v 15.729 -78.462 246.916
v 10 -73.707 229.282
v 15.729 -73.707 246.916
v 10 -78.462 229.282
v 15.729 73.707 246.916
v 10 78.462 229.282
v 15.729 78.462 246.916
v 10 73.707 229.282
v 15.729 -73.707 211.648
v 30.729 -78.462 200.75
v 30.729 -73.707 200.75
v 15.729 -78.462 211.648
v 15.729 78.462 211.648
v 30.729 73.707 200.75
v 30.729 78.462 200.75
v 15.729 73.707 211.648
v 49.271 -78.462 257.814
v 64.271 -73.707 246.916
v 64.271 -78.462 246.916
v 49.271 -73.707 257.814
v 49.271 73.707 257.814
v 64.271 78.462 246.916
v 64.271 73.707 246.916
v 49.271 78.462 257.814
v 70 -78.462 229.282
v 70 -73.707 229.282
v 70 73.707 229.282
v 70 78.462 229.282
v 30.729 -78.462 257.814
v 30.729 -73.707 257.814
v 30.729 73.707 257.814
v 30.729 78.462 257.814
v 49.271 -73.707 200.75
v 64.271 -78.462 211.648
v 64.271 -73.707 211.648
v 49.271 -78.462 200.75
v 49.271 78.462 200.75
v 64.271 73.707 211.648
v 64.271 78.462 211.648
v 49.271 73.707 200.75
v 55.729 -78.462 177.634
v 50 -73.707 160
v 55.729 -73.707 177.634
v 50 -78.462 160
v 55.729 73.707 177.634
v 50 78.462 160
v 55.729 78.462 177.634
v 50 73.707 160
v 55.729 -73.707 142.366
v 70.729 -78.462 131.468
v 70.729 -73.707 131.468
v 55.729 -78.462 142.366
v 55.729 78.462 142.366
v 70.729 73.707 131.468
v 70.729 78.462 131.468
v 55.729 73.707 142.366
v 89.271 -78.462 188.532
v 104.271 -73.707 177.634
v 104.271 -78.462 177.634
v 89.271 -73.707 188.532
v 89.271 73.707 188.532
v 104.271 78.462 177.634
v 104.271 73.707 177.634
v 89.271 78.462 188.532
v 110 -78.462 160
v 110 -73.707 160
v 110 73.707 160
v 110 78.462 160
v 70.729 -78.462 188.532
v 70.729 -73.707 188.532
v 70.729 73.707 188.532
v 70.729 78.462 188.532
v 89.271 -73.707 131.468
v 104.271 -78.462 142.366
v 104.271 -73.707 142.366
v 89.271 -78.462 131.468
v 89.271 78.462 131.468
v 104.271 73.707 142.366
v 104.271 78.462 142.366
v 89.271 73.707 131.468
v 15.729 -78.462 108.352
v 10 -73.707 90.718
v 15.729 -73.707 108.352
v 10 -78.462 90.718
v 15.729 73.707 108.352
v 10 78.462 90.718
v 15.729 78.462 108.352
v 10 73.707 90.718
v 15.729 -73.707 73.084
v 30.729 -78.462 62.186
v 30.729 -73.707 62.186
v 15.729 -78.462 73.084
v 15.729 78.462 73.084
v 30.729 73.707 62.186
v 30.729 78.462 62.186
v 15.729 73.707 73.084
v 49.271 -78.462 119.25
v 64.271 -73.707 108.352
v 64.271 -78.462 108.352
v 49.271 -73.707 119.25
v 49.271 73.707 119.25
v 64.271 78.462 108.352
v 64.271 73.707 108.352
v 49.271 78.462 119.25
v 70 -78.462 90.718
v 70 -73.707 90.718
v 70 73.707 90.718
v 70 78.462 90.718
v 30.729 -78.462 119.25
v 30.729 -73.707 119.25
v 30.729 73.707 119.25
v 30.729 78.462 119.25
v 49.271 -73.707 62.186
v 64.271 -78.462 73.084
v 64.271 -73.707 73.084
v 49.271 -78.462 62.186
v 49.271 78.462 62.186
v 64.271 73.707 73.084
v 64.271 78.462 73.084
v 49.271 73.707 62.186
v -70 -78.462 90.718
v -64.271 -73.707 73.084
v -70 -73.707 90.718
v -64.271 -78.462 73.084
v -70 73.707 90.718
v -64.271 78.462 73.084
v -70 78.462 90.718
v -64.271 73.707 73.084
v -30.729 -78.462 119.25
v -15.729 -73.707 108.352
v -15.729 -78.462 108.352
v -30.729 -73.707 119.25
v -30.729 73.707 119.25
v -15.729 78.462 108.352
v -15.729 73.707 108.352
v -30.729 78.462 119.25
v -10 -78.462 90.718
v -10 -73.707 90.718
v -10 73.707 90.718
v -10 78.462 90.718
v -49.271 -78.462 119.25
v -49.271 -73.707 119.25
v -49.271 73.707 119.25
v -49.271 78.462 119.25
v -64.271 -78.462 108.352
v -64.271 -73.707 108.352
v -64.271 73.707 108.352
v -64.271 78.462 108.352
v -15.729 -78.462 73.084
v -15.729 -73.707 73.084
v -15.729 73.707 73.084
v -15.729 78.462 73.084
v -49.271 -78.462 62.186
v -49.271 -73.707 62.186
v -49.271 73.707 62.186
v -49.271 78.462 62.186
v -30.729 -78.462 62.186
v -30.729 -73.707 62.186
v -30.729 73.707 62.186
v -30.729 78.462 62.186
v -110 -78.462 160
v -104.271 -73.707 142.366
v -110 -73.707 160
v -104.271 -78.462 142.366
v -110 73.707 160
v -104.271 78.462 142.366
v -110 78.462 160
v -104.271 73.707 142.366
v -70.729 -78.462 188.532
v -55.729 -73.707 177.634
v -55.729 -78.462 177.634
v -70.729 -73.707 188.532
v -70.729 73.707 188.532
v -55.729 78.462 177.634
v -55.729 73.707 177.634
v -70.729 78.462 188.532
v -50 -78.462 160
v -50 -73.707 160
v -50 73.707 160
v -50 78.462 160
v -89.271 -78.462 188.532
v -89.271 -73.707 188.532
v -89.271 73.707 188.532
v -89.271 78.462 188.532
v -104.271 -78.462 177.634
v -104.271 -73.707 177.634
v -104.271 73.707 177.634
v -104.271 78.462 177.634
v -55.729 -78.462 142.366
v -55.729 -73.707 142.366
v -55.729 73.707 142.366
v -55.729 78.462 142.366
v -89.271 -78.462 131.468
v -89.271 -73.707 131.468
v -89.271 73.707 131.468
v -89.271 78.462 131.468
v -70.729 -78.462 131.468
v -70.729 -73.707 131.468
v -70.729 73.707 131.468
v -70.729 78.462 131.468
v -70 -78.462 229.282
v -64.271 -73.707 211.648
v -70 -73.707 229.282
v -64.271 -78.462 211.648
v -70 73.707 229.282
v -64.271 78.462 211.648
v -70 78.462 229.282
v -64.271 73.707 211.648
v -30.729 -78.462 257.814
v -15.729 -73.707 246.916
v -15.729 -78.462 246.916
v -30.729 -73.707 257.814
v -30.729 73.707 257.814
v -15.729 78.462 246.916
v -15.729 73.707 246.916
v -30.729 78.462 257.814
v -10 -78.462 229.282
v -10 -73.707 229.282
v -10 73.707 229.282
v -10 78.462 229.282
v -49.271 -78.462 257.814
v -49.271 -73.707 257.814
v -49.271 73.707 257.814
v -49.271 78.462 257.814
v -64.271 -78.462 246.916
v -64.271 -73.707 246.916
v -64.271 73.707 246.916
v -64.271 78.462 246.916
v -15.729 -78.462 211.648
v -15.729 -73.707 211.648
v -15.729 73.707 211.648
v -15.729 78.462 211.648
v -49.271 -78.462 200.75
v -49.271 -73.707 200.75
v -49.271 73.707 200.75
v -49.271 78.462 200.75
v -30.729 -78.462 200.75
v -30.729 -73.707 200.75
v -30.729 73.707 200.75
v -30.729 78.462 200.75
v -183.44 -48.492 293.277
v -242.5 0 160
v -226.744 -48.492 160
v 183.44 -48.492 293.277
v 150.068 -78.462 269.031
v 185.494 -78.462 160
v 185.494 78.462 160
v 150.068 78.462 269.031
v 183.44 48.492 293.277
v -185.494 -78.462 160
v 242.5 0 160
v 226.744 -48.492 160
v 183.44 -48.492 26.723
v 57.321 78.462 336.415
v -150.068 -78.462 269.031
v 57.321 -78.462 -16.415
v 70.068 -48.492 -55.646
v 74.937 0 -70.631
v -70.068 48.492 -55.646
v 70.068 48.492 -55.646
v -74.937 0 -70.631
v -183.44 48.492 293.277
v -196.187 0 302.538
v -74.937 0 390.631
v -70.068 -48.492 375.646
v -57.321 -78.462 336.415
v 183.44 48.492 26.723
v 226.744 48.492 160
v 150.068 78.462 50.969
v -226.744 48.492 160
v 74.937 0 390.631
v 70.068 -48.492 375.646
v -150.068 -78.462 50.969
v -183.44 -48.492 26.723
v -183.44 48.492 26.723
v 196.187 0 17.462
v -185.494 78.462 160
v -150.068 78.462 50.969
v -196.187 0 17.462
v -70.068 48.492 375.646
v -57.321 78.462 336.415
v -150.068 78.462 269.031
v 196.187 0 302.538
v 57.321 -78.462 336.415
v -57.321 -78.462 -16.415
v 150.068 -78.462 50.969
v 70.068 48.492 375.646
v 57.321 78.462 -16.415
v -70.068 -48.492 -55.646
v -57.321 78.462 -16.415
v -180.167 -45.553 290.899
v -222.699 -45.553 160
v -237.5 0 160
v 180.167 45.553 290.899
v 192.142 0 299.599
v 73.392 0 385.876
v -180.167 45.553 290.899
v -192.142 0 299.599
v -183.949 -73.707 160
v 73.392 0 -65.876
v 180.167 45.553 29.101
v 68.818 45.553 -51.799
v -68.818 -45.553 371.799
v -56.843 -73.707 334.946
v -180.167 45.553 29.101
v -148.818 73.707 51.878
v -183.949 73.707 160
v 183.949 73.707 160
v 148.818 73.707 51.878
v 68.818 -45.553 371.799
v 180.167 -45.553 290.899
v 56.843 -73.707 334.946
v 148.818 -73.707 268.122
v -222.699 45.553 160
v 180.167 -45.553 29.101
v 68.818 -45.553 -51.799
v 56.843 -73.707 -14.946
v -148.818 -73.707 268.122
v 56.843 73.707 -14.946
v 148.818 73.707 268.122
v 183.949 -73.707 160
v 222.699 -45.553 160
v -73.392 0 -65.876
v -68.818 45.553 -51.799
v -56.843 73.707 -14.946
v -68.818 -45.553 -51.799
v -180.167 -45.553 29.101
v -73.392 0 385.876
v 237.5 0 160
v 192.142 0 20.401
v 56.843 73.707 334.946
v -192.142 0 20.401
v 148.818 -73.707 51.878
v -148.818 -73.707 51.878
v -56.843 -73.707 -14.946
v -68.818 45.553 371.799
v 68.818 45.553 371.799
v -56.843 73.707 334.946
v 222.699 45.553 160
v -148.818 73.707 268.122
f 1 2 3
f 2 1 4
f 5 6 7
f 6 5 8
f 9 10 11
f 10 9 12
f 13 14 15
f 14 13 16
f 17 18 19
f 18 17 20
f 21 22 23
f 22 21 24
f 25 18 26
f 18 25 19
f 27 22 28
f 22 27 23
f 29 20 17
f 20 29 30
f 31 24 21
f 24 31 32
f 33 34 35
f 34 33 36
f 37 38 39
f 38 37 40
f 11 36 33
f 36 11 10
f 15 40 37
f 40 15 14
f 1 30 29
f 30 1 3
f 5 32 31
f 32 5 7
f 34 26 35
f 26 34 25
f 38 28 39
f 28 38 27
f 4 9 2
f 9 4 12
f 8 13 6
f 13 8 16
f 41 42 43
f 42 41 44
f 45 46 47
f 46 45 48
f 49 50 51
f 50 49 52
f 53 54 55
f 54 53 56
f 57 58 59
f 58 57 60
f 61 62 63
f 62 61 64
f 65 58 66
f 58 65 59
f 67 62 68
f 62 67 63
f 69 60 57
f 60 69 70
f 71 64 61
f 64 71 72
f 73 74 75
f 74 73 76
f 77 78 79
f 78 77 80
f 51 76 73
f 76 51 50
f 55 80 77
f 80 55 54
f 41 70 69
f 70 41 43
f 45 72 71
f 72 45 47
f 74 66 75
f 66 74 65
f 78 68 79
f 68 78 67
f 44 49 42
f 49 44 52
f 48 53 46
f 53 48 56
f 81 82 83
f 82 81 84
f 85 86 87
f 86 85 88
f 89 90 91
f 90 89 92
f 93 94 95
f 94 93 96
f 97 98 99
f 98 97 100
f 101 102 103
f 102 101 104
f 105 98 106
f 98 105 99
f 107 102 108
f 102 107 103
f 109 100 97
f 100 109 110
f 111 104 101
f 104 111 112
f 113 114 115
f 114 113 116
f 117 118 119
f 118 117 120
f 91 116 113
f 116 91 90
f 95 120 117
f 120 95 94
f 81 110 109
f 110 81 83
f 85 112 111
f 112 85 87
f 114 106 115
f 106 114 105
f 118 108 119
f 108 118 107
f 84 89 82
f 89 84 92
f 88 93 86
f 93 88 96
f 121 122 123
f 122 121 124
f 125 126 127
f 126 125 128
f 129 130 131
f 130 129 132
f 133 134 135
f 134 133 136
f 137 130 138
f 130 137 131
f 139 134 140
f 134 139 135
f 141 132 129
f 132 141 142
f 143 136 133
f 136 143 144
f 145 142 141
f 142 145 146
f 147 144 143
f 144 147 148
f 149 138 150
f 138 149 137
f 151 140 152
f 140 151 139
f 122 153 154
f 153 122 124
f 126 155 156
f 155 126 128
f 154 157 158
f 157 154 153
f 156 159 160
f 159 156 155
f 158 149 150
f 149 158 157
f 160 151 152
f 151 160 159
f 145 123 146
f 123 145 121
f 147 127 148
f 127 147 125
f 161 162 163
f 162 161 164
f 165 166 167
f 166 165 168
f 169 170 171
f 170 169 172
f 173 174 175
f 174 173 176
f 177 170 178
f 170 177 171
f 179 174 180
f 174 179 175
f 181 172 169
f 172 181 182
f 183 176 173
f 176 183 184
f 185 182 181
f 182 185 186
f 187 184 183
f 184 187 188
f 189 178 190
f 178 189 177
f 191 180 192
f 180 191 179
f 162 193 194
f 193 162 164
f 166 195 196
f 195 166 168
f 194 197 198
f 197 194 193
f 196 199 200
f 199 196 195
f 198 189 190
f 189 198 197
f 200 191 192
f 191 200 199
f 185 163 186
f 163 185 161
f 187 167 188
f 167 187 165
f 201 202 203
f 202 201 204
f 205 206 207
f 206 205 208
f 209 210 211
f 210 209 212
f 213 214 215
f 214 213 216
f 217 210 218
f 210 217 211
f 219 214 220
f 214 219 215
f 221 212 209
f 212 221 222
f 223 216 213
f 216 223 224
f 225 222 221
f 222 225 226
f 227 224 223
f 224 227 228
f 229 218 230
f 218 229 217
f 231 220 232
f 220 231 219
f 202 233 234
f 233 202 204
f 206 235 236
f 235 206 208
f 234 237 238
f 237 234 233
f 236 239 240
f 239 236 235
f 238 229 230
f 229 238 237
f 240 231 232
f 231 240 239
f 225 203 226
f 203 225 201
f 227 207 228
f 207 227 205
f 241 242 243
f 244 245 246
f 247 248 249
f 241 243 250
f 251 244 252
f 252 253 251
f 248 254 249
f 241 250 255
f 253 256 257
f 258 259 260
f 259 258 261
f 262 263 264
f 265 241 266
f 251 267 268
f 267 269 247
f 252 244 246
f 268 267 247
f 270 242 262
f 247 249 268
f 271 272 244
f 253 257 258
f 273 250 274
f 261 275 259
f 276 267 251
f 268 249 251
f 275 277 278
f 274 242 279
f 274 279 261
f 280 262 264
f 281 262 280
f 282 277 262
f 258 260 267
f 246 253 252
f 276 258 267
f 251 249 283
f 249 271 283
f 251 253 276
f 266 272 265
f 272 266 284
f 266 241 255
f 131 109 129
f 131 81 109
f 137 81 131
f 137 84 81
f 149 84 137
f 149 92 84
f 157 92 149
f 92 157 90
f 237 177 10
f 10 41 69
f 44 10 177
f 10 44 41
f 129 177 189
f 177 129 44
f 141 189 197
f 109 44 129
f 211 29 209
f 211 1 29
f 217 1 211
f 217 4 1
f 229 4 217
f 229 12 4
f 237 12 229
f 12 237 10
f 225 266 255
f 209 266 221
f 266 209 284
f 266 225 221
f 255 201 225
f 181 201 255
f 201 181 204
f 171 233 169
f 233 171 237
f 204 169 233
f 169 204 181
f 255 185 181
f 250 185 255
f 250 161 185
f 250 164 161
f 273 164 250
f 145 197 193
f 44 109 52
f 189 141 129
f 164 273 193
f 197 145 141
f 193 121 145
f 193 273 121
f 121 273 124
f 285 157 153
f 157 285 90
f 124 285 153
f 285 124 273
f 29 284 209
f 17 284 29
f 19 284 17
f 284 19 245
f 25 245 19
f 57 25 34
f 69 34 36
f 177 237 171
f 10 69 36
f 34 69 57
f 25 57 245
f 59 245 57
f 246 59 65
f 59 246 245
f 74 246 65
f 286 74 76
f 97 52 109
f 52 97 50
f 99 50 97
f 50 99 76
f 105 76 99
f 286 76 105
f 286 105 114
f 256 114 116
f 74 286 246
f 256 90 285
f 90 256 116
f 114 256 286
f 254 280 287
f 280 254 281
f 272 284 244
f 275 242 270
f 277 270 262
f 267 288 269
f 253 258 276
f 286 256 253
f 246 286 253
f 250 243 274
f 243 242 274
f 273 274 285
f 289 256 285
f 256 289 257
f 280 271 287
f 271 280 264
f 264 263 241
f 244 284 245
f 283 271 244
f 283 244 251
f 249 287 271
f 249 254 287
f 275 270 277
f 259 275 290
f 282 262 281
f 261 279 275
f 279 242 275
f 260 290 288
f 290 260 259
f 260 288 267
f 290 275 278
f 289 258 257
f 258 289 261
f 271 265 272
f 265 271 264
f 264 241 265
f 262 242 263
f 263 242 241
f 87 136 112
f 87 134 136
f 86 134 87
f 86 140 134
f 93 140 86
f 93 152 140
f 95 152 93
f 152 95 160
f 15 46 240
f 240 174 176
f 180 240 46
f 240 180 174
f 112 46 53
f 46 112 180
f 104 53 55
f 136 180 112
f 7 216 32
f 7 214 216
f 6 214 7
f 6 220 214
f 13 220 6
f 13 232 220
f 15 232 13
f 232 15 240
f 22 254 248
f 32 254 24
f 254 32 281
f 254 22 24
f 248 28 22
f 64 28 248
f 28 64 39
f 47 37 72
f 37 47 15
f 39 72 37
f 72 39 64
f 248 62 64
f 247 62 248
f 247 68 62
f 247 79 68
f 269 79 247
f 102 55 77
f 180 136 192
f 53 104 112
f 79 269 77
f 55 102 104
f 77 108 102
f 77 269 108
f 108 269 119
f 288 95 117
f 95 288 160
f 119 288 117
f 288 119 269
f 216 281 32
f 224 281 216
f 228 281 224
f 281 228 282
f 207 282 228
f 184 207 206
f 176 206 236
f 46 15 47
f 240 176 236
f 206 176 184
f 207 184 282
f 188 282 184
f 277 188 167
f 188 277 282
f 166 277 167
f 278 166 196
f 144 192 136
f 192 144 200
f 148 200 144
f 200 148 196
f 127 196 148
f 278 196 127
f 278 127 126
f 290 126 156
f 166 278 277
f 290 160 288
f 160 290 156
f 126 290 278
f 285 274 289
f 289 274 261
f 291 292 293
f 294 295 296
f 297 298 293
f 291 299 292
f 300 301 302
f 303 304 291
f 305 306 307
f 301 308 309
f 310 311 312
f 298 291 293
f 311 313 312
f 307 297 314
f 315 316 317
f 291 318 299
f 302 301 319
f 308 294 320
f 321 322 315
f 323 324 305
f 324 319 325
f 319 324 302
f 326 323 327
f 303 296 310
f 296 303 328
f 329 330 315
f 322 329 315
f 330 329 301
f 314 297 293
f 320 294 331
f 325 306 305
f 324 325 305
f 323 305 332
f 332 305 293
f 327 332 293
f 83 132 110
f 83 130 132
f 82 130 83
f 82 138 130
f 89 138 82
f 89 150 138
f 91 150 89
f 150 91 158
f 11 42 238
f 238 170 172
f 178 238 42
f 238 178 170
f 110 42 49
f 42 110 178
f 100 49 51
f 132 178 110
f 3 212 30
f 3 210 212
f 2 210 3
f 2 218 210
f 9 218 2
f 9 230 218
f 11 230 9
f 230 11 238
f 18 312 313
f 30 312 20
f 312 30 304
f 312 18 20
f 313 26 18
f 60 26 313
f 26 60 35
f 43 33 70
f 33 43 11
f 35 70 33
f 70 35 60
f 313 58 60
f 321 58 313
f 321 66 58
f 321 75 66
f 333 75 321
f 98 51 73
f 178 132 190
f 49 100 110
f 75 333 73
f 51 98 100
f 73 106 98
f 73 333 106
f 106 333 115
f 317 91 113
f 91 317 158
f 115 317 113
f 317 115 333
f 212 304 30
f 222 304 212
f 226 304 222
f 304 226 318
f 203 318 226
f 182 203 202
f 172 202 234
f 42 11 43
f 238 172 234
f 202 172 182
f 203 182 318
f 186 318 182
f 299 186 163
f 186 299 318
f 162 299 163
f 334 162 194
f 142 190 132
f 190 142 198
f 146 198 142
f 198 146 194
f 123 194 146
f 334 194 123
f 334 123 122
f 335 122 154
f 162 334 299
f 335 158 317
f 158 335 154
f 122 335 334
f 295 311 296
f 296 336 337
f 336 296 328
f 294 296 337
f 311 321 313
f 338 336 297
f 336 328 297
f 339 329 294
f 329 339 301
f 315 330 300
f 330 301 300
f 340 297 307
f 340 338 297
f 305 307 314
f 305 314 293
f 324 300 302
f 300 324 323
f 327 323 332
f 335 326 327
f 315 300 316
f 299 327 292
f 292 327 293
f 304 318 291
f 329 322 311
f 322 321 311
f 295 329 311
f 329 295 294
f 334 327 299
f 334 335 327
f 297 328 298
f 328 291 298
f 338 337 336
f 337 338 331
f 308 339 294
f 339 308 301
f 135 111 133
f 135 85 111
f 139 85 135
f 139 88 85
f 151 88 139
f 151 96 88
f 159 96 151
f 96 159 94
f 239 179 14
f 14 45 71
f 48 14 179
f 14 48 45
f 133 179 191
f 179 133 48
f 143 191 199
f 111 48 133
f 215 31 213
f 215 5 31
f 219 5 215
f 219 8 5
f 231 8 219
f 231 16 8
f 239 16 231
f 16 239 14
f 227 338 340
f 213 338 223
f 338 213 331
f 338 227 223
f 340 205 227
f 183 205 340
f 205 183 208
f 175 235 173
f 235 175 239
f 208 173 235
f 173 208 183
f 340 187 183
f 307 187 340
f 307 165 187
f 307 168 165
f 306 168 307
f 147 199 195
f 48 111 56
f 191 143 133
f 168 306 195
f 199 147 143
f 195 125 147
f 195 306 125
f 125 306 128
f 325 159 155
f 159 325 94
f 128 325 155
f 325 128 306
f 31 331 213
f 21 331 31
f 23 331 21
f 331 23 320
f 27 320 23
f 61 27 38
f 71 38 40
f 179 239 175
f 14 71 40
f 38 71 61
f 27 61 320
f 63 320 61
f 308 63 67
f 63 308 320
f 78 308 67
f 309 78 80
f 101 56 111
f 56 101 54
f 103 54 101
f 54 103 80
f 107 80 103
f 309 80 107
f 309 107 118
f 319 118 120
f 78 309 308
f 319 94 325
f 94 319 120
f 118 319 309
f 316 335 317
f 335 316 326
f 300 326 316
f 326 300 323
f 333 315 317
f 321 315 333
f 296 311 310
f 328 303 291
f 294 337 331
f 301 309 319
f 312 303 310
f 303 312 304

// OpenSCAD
/*
 * Antenna Rotator 16 kg-m
 * Copyright 2012 John Pritchard
 *
 * This program is free software: you can redistribute it and/or modify
 * it under the terms of the GNU General Public License as published by
 * the Free Software Foundation, either version 3 of the License, or
 * (at your option) any later version.
 *
 * This program is distributed in the hope that it will be useful,
 * but WITHOUT ANY WARRANTY; without even the implied warranty of
 * MERCHANTABILITY or FITNESS FOR A PARTICULAR PURPOSE.  See the
 * GNU General Public License for more details.
 *
 * You should have received a copy of the GNU General Public License
 * along with this program.  If not, see <http://www.gnu.org/licenses/>.
 */
resolution = 10;


/*
 * Bearing for vertical rotator and mating to horizontal rotator
 */


module toroid_constructor(wall = 0.0){
    translate([0,0,160]){
        hull(){
            rotate([90,0,0]){
                rotate_extrude($fn = resolution){
                    translate([160, 0, 0]){
                        circle(r = (80+wall), $fn = resolution);
                    }
                }
               cylinder(r = 160, h = (80+wall), center = true, $fn = resolution);
            }
        }
    }
}
module toroid_escapes(){
    translate([0,0,160]){
        rotate([90,0,0]){
            for ( i = [30 : 60 : 360] ){
                translate([sin(i)*80, cos(i)*80, 0])
                cylinder(r = 30, h = 161, center = true, $fn = resolution);
            }
        }
    }
}
module toroid(){
    difference(){
        toroid_constructor(+2.5);
        toroid_constructor(-2.5);
        toroid_escapes();
    }
}
module column_constructor(wall = 0.0){

    translate([0,0,310]){
        sphere(r = (90+wall), $fn = resolution);
    }
    translate([0,0,120]){
        cylinder(r1 = (120+wall), r2 = (90+wall), h = 380, center = true, $fn = resolution);
    }
}
module column(){
    difference(){
        column_constructor(+2.5);
        column_constructor(-2.5);
    }
}

module vertical_bearing(){
    union(){
        toroid();
        column();
    }
}

//vertical_bearing();

toroid();
